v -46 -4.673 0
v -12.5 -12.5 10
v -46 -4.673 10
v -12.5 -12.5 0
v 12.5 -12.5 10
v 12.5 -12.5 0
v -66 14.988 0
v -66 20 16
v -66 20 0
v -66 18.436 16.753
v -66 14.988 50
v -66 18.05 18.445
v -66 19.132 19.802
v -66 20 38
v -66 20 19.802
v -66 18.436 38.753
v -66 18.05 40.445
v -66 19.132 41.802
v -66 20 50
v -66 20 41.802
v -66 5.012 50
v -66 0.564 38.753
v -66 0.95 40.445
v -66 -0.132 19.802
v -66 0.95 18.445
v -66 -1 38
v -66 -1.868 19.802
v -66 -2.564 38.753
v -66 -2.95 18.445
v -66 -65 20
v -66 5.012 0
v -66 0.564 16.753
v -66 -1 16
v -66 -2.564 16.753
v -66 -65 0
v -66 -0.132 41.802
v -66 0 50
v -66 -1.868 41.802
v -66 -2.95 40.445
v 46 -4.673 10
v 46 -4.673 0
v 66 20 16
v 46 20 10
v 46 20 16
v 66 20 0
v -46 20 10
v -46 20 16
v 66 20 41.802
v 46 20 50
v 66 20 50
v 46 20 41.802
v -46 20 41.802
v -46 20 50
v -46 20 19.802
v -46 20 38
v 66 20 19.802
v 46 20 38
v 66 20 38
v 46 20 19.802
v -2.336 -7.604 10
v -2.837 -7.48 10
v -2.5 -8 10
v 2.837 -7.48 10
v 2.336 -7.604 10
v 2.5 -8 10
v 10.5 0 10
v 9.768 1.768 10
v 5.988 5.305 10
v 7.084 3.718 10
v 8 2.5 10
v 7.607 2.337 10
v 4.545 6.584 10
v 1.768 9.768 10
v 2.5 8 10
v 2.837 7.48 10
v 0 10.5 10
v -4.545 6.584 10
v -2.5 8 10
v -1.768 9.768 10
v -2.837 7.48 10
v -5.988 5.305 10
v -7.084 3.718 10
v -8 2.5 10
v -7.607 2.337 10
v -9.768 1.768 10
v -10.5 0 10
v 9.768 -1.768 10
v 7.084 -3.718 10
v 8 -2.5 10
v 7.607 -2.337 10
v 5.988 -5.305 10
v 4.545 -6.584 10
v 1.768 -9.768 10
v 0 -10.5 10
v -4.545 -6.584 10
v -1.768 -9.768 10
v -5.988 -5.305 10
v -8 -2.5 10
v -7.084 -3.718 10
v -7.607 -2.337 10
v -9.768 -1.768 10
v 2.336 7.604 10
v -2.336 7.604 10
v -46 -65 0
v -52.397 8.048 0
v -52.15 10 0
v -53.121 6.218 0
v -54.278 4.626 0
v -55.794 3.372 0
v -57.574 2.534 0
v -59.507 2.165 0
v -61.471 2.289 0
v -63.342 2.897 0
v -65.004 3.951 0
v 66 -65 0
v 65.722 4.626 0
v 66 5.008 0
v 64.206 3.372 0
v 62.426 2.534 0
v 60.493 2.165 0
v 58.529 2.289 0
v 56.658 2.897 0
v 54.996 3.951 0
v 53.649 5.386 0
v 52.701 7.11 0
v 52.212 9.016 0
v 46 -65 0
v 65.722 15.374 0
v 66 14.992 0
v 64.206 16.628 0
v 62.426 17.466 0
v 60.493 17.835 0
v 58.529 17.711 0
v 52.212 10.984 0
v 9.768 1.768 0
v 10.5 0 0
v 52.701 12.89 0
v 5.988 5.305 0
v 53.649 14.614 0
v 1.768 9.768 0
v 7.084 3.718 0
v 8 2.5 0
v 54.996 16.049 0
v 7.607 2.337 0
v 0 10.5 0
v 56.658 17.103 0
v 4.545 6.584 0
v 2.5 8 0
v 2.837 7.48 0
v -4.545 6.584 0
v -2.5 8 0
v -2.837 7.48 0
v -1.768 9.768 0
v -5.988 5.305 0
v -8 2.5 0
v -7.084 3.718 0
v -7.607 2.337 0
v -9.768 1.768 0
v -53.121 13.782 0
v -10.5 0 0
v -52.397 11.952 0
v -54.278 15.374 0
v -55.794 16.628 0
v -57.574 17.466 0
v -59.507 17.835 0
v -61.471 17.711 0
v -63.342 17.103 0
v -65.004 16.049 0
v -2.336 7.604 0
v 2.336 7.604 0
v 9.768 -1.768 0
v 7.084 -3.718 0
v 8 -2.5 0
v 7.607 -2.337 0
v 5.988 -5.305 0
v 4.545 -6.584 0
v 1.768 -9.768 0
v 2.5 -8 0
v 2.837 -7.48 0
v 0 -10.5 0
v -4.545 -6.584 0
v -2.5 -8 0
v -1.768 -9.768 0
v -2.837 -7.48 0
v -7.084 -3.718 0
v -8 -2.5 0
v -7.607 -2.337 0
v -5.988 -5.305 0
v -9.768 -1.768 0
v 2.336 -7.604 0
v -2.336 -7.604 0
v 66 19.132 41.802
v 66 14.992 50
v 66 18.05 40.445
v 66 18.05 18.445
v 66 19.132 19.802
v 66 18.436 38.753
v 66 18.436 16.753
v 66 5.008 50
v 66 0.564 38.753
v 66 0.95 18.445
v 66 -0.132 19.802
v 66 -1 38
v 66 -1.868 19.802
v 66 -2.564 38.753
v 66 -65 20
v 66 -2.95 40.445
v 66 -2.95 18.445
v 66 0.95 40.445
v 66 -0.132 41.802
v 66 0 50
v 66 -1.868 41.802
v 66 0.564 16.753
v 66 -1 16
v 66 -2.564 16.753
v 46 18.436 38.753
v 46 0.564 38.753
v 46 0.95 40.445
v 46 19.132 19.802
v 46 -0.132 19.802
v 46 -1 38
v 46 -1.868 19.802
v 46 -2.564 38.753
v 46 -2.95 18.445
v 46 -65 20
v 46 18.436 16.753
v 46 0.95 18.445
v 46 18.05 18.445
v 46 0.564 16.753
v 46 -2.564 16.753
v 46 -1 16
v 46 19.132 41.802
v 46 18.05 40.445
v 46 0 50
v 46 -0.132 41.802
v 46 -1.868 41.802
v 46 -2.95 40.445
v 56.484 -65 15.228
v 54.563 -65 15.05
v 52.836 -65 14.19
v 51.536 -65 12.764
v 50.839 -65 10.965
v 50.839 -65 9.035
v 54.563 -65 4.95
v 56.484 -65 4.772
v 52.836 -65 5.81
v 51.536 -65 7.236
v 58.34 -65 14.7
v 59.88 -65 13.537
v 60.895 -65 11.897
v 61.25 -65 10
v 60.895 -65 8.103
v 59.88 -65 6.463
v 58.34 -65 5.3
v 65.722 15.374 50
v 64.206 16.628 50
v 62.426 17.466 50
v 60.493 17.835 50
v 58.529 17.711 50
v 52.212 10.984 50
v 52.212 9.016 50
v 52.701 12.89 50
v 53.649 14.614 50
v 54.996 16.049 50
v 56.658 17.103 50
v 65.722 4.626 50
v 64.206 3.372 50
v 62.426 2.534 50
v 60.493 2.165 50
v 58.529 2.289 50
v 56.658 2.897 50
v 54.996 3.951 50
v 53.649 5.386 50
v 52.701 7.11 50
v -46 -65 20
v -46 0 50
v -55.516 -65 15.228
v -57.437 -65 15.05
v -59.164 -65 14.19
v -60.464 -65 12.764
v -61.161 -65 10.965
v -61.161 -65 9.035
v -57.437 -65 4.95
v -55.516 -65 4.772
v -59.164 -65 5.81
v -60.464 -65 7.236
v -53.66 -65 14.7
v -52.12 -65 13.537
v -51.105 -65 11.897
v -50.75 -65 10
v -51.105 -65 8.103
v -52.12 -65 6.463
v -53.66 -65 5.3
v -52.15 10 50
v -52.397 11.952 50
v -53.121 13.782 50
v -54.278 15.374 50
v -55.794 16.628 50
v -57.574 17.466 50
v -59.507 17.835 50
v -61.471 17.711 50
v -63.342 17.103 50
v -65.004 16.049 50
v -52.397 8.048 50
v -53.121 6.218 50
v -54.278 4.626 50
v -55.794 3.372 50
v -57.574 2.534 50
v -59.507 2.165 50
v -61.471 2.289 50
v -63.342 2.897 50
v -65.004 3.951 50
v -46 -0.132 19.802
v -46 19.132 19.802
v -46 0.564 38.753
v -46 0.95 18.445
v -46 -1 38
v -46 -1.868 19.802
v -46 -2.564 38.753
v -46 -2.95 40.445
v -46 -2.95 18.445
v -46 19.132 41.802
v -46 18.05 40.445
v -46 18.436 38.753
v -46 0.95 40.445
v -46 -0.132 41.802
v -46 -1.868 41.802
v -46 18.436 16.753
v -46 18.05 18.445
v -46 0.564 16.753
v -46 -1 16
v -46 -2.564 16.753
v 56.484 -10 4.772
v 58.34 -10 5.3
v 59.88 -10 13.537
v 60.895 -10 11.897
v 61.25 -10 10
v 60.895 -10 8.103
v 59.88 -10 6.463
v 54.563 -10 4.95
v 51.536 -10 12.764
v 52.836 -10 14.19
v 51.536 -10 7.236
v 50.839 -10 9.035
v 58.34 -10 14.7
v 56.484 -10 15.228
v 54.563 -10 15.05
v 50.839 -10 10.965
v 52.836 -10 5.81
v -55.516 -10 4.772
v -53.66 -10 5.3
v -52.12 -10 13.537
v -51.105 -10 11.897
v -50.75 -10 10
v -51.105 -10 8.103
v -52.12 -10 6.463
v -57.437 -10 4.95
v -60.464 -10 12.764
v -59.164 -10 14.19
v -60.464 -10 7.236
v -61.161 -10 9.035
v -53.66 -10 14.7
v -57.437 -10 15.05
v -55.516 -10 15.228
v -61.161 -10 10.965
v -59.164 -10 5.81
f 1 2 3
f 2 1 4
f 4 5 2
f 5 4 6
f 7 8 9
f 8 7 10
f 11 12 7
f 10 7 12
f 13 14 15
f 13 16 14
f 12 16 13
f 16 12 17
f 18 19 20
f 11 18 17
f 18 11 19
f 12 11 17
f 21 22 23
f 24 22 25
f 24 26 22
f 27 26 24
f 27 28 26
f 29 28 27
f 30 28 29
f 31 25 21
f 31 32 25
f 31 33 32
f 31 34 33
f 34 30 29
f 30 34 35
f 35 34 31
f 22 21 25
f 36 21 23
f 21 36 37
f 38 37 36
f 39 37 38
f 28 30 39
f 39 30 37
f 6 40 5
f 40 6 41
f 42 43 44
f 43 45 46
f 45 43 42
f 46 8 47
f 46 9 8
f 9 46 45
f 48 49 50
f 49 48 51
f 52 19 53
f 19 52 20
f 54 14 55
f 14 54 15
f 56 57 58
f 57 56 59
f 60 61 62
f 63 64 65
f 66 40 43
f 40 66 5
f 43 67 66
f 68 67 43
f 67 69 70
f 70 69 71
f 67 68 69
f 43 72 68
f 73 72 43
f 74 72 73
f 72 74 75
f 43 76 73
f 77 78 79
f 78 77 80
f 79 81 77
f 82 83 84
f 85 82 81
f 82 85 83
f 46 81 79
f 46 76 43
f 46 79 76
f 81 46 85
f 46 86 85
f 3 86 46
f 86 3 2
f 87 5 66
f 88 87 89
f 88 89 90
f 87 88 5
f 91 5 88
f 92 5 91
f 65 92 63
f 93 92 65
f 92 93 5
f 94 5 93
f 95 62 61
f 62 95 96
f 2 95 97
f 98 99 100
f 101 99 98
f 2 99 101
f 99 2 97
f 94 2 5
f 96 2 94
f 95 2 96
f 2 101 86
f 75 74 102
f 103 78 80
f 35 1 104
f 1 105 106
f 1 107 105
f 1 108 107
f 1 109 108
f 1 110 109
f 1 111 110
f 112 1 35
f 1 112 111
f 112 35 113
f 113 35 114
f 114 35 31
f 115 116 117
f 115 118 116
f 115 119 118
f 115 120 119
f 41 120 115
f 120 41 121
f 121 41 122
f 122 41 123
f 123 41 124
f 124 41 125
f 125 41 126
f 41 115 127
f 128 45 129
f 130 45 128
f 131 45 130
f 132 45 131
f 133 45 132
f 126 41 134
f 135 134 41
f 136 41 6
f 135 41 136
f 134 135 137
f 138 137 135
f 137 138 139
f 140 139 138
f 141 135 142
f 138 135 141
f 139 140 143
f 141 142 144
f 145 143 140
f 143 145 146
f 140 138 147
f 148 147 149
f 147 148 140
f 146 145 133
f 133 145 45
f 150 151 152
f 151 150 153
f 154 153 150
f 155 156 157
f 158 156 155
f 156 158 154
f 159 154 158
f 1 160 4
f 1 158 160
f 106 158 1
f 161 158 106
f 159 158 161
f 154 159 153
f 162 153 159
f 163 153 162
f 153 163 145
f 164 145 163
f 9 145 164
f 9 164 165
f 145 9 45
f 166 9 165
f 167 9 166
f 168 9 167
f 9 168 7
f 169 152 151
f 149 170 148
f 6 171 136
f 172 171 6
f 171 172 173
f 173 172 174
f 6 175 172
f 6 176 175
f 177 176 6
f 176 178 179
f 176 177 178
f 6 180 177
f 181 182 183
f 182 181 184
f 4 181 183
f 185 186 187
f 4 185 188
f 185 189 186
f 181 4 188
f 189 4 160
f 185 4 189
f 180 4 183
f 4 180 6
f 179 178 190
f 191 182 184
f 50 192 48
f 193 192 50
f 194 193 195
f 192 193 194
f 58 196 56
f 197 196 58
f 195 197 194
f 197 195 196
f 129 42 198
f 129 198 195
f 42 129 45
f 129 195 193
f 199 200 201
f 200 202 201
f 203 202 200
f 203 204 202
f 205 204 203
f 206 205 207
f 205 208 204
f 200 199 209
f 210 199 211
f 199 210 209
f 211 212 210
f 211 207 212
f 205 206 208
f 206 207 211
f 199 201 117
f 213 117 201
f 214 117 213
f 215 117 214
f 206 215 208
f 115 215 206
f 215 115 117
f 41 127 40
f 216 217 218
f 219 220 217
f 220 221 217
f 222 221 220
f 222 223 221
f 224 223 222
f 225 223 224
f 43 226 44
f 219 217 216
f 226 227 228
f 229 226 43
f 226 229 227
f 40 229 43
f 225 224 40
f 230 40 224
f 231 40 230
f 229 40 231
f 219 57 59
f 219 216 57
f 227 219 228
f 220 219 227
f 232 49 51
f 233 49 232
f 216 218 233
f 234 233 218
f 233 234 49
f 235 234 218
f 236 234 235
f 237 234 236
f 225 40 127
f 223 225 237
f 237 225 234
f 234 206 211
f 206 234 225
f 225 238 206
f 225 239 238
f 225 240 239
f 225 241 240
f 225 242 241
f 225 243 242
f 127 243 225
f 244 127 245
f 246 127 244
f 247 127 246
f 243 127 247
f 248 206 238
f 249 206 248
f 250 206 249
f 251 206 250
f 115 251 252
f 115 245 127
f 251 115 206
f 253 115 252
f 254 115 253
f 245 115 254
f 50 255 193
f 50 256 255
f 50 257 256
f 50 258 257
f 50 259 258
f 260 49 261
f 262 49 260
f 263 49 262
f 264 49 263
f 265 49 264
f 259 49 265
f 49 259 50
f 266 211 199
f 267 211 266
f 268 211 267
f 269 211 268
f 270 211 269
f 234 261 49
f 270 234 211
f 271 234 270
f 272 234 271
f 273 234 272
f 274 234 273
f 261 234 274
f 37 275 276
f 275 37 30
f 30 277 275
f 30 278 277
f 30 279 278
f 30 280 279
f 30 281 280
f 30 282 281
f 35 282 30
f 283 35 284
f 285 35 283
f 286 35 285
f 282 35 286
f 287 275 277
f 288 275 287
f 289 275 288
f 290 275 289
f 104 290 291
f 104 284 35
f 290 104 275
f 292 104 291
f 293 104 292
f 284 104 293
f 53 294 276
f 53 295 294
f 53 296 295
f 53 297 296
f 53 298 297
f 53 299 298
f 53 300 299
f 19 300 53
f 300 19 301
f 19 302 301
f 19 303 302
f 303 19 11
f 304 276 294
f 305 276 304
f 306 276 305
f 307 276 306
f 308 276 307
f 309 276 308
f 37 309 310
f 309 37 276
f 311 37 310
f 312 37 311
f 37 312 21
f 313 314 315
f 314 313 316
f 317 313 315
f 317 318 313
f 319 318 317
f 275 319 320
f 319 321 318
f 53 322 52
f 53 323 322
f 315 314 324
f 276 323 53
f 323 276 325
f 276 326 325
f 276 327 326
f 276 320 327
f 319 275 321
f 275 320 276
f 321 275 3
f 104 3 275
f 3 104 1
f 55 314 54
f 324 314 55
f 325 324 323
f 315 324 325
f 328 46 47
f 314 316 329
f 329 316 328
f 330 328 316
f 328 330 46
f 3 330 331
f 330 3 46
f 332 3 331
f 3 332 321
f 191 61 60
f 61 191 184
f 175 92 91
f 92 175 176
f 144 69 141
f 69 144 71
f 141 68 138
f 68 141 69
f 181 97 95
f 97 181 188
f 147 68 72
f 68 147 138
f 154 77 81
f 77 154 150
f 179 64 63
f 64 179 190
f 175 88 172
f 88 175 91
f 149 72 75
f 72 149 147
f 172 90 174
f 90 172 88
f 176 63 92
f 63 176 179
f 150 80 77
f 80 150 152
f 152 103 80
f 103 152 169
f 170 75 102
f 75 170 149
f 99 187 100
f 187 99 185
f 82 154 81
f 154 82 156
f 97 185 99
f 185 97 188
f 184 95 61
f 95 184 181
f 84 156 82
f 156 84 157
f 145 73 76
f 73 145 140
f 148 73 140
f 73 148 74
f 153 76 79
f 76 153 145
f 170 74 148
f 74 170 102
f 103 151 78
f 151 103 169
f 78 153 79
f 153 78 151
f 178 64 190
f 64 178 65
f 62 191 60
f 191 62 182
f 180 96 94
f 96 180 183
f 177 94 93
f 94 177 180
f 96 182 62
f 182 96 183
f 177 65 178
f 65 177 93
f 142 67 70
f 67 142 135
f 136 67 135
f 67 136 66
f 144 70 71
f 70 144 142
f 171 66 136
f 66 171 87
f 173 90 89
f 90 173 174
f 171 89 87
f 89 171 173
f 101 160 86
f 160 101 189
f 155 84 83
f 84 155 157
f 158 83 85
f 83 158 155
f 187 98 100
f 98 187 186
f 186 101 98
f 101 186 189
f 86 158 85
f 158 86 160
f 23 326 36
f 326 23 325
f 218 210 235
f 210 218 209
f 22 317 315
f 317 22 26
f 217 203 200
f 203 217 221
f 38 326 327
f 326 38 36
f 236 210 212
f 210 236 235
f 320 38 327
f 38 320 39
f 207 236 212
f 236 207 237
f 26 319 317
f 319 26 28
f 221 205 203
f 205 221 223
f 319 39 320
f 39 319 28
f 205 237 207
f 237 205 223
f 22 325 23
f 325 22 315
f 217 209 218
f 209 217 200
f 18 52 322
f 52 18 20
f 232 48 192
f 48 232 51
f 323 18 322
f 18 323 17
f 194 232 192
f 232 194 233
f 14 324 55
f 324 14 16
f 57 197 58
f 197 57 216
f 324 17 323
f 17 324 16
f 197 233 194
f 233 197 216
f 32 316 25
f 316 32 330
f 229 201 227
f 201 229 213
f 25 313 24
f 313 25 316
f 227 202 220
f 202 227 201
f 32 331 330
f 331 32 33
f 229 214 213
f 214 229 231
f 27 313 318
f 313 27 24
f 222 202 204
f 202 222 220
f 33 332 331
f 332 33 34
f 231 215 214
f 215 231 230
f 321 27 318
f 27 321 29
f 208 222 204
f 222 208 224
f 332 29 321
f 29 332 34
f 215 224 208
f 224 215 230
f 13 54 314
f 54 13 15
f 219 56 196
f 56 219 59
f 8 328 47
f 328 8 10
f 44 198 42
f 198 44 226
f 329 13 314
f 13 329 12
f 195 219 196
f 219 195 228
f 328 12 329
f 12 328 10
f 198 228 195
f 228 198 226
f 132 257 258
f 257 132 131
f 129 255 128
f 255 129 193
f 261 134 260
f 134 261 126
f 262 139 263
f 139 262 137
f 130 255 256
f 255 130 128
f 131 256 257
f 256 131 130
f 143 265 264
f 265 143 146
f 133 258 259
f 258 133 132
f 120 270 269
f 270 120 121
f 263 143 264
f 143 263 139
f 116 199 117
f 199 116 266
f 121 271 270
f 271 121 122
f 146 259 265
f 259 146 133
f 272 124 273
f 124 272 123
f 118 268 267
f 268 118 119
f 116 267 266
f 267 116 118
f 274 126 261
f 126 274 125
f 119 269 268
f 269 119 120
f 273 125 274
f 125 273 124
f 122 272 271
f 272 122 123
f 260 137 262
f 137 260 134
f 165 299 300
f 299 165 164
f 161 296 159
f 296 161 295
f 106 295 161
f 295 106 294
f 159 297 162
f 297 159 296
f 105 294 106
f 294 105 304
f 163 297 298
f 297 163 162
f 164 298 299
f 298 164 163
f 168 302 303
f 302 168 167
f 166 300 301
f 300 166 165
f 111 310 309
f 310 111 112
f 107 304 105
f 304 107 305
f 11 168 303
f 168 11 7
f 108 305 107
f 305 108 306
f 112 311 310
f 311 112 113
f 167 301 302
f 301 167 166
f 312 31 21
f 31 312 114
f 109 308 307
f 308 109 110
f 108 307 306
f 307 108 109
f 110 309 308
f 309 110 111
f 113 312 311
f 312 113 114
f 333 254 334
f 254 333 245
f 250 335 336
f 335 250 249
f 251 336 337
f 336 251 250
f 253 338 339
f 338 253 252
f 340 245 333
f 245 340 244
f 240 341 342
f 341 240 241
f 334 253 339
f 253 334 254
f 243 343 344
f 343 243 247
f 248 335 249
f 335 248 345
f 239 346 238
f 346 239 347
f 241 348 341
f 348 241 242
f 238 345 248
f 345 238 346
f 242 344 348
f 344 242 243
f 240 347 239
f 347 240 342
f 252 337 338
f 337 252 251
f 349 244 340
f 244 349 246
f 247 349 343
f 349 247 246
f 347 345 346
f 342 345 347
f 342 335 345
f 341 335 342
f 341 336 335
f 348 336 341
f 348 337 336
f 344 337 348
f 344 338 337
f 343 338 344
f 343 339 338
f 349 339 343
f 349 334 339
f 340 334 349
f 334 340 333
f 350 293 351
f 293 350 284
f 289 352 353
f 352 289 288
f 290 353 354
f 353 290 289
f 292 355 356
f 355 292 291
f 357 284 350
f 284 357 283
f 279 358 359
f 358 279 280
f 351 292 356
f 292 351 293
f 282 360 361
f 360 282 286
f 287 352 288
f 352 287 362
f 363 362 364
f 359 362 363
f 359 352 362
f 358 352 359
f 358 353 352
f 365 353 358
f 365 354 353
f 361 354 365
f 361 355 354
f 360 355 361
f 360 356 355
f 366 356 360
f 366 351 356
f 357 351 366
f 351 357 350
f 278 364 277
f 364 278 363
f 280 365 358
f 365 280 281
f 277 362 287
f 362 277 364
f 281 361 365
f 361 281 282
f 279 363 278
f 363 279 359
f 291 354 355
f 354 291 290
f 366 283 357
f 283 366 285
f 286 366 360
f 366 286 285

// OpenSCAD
//translate([0,0,0])import("bandejaacme.stl");


module huecoacme(){
    cylinder(r=16/2,h=50);
    translate([0,8,0])cylinder(r=5/2,h=50);
    translate([0,-8,0])cylinder(r=5/2,h=50);
    translate([8,0,0])cylinder(r=5/2,h=50);
    translate([-8,0,0])cylinder(r=5/2,h=50);
    //cylinder(r=23/2,h=20);
}
difference(){
union(){
altacme=10;
hull(){
translate([0,0,altacme/2])cube([25,25,altacme],center=true);
translate([60-4,10,altacme/2])cube([20,20,altacme],center=true);
translate([-60+4,10,altacme/2])cube([20,20,altacme],center=true);
}
hull(){
translate([60-4,10,50/2])cube([20,20,50],center=true);
translate([50+16,0,0])rotate([0,0,180])cube([20,65,20]);
}
hull(){
translate([-60+4,10,50/2])cube([20,20,50],center=true);
translate([-52+6,0,0])rotate([0,0,180])cube([20,65,20]);
}

}


    translate([0,0,-18])huecoacme();
    translate([60,10,-5])cylinder(r=15.7/2,h=60);
    translate([-60,10,-5])cylinder(r=15.7/2,h=60);
    translate([59-3,-10,10])rotate([90,0,0])cylinder(r=10.5/2,h=80);
    translate([-59+3,-10,10])rotate([90,0,0])cylinder(r=10.5/2,h=80);
translate([0,0,40]){
translate([0,-1,0])rotate([0,90,0])cylinder(r=2,h=200,center=true);
translate([0,20,0])rotate([0,90,0])cylinder(r=2,h=200,center=true);
}
translate([0,0,18]){
translate([0,-1,0])rotate([0,90,0])cylinder(r=2,h=200,center=true);
translate([0,20,0])rotate([0,90,0])cylinder(r=2,h=200,center=true);
}

}
